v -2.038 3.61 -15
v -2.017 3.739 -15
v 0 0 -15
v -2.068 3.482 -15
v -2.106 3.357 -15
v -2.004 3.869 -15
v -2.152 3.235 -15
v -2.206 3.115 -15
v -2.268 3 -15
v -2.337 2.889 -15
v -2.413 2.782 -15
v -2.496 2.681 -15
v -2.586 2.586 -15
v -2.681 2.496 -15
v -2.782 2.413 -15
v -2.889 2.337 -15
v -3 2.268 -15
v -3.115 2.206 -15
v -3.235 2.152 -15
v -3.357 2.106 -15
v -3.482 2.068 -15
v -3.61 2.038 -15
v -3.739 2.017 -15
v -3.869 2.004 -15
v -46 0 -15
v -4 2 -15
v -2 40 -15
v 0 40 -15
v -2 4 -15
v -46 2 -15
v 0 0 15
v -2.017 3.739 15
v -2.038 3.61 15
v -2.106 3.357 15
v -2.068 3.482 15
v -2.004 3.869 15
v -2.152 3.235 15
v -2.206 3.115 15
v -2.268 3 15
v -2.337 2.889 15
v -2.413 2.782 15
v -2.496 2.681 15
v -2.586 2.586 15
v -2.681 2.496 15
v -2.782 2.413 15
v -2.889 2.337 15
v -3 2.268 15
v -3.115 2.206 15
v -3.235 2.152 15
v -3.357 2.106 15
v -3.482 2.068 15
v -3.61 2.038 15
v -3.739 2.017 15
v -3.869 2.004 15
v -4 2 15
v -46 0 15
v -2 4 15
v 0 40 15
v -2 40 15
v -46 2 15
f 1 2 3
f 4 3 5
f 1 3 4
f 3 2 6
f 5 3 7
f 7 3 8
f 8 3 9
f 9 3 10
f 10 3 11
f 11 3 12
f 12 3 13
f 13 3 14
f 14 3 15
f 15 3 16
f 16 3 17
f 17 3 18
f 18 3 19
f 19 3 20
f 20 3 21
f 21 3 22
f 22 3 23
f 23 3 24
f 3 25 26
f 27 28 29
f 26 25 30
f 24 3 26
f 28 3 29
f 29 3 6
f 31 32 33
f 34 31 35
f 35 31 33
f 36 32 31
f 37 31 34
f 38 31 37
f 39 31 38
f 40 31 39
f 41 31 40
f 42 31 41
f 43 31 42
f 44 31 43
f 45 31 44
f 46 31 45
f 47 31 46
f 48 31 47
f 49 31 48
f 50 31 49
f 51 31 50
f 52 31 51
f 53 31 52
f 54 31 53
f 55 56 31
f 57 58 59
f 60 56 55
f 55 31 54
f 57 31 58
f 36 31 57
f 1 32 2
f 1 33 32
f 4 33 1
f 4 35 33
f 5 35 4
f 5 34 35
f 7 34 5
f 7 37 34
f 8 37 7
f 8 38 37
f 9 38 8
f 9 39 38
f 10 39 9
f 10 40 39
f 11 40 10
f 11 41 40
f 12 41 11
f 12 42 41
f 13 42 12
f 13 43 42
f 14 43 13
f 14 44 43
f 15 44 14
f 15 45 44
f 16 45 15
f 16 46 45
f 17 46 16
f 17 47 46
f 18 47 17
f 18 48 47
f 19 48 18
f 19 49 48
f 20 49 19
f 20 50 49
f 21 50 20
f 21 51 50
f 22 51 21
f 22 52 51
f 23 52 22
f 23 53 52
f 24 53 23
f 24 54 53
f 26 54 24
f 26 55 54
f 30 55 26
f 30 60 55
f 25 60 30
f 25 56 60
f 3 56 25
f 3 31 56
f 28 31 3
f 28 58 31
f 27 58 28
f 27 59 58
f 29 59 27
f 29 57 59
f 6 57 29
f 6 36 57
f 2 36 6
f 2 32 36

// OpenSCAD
// Units: mm

thickness_mm = 2.0;
bend_radius_mm = 2.0;
k_factor = 0.45;

outside_len_a_mm = 50.0;
outside_len_b_mm = 40.0;
width_mm = 30.0;
bend_angle_deg = 90.0;

bend_allowance_mm = (PI / 2) * (bend_radius_mm + k_factor * thickness_mm);
outside_setback_mm = (bend_radius_mm + thickness_mm) * tan(bend_angle_deg / 2);
flat_length_mm = outside_len_a_mm + outside_len_b_mm - (2 * outside_setback_mm - bend_allowance_mm);

echo(str(
    "MAKERBENCH-SHEETMETAL: {\"thickness_mm\": ",
    thickness_mm,
    ", \"bend_radius_mm\": ",
    bend_radius_mm,
    ", \"flat_length_mm\": ",
    flat_length_mm,
    "}"
));

$fn = 96;

module l_bracket_profile_2d() {
    r_in = bend_radius_mm;
    r_out = bend_radius_mm + thickness_mm;

    straight_a = outside_len_a_mm - r_out;
    straight_b = outside_len_b_mm - r_out;

    union() {
        translate([-straight_a, 0])
            square([straight_a, thickness_mm]);

        translate([-r_out, 0])
            difference() {
                square([r_out, r_out]);
                translate([0, r_out])
                    circle(r = r_in);
            }

        translate([-thickness_mm, r_out])
            square([thickness_mm, straight_b]);
    }
}

linear_extrude(height = width_mm, center = true, convexity = 10)
    l_bracket_profile_2d();
